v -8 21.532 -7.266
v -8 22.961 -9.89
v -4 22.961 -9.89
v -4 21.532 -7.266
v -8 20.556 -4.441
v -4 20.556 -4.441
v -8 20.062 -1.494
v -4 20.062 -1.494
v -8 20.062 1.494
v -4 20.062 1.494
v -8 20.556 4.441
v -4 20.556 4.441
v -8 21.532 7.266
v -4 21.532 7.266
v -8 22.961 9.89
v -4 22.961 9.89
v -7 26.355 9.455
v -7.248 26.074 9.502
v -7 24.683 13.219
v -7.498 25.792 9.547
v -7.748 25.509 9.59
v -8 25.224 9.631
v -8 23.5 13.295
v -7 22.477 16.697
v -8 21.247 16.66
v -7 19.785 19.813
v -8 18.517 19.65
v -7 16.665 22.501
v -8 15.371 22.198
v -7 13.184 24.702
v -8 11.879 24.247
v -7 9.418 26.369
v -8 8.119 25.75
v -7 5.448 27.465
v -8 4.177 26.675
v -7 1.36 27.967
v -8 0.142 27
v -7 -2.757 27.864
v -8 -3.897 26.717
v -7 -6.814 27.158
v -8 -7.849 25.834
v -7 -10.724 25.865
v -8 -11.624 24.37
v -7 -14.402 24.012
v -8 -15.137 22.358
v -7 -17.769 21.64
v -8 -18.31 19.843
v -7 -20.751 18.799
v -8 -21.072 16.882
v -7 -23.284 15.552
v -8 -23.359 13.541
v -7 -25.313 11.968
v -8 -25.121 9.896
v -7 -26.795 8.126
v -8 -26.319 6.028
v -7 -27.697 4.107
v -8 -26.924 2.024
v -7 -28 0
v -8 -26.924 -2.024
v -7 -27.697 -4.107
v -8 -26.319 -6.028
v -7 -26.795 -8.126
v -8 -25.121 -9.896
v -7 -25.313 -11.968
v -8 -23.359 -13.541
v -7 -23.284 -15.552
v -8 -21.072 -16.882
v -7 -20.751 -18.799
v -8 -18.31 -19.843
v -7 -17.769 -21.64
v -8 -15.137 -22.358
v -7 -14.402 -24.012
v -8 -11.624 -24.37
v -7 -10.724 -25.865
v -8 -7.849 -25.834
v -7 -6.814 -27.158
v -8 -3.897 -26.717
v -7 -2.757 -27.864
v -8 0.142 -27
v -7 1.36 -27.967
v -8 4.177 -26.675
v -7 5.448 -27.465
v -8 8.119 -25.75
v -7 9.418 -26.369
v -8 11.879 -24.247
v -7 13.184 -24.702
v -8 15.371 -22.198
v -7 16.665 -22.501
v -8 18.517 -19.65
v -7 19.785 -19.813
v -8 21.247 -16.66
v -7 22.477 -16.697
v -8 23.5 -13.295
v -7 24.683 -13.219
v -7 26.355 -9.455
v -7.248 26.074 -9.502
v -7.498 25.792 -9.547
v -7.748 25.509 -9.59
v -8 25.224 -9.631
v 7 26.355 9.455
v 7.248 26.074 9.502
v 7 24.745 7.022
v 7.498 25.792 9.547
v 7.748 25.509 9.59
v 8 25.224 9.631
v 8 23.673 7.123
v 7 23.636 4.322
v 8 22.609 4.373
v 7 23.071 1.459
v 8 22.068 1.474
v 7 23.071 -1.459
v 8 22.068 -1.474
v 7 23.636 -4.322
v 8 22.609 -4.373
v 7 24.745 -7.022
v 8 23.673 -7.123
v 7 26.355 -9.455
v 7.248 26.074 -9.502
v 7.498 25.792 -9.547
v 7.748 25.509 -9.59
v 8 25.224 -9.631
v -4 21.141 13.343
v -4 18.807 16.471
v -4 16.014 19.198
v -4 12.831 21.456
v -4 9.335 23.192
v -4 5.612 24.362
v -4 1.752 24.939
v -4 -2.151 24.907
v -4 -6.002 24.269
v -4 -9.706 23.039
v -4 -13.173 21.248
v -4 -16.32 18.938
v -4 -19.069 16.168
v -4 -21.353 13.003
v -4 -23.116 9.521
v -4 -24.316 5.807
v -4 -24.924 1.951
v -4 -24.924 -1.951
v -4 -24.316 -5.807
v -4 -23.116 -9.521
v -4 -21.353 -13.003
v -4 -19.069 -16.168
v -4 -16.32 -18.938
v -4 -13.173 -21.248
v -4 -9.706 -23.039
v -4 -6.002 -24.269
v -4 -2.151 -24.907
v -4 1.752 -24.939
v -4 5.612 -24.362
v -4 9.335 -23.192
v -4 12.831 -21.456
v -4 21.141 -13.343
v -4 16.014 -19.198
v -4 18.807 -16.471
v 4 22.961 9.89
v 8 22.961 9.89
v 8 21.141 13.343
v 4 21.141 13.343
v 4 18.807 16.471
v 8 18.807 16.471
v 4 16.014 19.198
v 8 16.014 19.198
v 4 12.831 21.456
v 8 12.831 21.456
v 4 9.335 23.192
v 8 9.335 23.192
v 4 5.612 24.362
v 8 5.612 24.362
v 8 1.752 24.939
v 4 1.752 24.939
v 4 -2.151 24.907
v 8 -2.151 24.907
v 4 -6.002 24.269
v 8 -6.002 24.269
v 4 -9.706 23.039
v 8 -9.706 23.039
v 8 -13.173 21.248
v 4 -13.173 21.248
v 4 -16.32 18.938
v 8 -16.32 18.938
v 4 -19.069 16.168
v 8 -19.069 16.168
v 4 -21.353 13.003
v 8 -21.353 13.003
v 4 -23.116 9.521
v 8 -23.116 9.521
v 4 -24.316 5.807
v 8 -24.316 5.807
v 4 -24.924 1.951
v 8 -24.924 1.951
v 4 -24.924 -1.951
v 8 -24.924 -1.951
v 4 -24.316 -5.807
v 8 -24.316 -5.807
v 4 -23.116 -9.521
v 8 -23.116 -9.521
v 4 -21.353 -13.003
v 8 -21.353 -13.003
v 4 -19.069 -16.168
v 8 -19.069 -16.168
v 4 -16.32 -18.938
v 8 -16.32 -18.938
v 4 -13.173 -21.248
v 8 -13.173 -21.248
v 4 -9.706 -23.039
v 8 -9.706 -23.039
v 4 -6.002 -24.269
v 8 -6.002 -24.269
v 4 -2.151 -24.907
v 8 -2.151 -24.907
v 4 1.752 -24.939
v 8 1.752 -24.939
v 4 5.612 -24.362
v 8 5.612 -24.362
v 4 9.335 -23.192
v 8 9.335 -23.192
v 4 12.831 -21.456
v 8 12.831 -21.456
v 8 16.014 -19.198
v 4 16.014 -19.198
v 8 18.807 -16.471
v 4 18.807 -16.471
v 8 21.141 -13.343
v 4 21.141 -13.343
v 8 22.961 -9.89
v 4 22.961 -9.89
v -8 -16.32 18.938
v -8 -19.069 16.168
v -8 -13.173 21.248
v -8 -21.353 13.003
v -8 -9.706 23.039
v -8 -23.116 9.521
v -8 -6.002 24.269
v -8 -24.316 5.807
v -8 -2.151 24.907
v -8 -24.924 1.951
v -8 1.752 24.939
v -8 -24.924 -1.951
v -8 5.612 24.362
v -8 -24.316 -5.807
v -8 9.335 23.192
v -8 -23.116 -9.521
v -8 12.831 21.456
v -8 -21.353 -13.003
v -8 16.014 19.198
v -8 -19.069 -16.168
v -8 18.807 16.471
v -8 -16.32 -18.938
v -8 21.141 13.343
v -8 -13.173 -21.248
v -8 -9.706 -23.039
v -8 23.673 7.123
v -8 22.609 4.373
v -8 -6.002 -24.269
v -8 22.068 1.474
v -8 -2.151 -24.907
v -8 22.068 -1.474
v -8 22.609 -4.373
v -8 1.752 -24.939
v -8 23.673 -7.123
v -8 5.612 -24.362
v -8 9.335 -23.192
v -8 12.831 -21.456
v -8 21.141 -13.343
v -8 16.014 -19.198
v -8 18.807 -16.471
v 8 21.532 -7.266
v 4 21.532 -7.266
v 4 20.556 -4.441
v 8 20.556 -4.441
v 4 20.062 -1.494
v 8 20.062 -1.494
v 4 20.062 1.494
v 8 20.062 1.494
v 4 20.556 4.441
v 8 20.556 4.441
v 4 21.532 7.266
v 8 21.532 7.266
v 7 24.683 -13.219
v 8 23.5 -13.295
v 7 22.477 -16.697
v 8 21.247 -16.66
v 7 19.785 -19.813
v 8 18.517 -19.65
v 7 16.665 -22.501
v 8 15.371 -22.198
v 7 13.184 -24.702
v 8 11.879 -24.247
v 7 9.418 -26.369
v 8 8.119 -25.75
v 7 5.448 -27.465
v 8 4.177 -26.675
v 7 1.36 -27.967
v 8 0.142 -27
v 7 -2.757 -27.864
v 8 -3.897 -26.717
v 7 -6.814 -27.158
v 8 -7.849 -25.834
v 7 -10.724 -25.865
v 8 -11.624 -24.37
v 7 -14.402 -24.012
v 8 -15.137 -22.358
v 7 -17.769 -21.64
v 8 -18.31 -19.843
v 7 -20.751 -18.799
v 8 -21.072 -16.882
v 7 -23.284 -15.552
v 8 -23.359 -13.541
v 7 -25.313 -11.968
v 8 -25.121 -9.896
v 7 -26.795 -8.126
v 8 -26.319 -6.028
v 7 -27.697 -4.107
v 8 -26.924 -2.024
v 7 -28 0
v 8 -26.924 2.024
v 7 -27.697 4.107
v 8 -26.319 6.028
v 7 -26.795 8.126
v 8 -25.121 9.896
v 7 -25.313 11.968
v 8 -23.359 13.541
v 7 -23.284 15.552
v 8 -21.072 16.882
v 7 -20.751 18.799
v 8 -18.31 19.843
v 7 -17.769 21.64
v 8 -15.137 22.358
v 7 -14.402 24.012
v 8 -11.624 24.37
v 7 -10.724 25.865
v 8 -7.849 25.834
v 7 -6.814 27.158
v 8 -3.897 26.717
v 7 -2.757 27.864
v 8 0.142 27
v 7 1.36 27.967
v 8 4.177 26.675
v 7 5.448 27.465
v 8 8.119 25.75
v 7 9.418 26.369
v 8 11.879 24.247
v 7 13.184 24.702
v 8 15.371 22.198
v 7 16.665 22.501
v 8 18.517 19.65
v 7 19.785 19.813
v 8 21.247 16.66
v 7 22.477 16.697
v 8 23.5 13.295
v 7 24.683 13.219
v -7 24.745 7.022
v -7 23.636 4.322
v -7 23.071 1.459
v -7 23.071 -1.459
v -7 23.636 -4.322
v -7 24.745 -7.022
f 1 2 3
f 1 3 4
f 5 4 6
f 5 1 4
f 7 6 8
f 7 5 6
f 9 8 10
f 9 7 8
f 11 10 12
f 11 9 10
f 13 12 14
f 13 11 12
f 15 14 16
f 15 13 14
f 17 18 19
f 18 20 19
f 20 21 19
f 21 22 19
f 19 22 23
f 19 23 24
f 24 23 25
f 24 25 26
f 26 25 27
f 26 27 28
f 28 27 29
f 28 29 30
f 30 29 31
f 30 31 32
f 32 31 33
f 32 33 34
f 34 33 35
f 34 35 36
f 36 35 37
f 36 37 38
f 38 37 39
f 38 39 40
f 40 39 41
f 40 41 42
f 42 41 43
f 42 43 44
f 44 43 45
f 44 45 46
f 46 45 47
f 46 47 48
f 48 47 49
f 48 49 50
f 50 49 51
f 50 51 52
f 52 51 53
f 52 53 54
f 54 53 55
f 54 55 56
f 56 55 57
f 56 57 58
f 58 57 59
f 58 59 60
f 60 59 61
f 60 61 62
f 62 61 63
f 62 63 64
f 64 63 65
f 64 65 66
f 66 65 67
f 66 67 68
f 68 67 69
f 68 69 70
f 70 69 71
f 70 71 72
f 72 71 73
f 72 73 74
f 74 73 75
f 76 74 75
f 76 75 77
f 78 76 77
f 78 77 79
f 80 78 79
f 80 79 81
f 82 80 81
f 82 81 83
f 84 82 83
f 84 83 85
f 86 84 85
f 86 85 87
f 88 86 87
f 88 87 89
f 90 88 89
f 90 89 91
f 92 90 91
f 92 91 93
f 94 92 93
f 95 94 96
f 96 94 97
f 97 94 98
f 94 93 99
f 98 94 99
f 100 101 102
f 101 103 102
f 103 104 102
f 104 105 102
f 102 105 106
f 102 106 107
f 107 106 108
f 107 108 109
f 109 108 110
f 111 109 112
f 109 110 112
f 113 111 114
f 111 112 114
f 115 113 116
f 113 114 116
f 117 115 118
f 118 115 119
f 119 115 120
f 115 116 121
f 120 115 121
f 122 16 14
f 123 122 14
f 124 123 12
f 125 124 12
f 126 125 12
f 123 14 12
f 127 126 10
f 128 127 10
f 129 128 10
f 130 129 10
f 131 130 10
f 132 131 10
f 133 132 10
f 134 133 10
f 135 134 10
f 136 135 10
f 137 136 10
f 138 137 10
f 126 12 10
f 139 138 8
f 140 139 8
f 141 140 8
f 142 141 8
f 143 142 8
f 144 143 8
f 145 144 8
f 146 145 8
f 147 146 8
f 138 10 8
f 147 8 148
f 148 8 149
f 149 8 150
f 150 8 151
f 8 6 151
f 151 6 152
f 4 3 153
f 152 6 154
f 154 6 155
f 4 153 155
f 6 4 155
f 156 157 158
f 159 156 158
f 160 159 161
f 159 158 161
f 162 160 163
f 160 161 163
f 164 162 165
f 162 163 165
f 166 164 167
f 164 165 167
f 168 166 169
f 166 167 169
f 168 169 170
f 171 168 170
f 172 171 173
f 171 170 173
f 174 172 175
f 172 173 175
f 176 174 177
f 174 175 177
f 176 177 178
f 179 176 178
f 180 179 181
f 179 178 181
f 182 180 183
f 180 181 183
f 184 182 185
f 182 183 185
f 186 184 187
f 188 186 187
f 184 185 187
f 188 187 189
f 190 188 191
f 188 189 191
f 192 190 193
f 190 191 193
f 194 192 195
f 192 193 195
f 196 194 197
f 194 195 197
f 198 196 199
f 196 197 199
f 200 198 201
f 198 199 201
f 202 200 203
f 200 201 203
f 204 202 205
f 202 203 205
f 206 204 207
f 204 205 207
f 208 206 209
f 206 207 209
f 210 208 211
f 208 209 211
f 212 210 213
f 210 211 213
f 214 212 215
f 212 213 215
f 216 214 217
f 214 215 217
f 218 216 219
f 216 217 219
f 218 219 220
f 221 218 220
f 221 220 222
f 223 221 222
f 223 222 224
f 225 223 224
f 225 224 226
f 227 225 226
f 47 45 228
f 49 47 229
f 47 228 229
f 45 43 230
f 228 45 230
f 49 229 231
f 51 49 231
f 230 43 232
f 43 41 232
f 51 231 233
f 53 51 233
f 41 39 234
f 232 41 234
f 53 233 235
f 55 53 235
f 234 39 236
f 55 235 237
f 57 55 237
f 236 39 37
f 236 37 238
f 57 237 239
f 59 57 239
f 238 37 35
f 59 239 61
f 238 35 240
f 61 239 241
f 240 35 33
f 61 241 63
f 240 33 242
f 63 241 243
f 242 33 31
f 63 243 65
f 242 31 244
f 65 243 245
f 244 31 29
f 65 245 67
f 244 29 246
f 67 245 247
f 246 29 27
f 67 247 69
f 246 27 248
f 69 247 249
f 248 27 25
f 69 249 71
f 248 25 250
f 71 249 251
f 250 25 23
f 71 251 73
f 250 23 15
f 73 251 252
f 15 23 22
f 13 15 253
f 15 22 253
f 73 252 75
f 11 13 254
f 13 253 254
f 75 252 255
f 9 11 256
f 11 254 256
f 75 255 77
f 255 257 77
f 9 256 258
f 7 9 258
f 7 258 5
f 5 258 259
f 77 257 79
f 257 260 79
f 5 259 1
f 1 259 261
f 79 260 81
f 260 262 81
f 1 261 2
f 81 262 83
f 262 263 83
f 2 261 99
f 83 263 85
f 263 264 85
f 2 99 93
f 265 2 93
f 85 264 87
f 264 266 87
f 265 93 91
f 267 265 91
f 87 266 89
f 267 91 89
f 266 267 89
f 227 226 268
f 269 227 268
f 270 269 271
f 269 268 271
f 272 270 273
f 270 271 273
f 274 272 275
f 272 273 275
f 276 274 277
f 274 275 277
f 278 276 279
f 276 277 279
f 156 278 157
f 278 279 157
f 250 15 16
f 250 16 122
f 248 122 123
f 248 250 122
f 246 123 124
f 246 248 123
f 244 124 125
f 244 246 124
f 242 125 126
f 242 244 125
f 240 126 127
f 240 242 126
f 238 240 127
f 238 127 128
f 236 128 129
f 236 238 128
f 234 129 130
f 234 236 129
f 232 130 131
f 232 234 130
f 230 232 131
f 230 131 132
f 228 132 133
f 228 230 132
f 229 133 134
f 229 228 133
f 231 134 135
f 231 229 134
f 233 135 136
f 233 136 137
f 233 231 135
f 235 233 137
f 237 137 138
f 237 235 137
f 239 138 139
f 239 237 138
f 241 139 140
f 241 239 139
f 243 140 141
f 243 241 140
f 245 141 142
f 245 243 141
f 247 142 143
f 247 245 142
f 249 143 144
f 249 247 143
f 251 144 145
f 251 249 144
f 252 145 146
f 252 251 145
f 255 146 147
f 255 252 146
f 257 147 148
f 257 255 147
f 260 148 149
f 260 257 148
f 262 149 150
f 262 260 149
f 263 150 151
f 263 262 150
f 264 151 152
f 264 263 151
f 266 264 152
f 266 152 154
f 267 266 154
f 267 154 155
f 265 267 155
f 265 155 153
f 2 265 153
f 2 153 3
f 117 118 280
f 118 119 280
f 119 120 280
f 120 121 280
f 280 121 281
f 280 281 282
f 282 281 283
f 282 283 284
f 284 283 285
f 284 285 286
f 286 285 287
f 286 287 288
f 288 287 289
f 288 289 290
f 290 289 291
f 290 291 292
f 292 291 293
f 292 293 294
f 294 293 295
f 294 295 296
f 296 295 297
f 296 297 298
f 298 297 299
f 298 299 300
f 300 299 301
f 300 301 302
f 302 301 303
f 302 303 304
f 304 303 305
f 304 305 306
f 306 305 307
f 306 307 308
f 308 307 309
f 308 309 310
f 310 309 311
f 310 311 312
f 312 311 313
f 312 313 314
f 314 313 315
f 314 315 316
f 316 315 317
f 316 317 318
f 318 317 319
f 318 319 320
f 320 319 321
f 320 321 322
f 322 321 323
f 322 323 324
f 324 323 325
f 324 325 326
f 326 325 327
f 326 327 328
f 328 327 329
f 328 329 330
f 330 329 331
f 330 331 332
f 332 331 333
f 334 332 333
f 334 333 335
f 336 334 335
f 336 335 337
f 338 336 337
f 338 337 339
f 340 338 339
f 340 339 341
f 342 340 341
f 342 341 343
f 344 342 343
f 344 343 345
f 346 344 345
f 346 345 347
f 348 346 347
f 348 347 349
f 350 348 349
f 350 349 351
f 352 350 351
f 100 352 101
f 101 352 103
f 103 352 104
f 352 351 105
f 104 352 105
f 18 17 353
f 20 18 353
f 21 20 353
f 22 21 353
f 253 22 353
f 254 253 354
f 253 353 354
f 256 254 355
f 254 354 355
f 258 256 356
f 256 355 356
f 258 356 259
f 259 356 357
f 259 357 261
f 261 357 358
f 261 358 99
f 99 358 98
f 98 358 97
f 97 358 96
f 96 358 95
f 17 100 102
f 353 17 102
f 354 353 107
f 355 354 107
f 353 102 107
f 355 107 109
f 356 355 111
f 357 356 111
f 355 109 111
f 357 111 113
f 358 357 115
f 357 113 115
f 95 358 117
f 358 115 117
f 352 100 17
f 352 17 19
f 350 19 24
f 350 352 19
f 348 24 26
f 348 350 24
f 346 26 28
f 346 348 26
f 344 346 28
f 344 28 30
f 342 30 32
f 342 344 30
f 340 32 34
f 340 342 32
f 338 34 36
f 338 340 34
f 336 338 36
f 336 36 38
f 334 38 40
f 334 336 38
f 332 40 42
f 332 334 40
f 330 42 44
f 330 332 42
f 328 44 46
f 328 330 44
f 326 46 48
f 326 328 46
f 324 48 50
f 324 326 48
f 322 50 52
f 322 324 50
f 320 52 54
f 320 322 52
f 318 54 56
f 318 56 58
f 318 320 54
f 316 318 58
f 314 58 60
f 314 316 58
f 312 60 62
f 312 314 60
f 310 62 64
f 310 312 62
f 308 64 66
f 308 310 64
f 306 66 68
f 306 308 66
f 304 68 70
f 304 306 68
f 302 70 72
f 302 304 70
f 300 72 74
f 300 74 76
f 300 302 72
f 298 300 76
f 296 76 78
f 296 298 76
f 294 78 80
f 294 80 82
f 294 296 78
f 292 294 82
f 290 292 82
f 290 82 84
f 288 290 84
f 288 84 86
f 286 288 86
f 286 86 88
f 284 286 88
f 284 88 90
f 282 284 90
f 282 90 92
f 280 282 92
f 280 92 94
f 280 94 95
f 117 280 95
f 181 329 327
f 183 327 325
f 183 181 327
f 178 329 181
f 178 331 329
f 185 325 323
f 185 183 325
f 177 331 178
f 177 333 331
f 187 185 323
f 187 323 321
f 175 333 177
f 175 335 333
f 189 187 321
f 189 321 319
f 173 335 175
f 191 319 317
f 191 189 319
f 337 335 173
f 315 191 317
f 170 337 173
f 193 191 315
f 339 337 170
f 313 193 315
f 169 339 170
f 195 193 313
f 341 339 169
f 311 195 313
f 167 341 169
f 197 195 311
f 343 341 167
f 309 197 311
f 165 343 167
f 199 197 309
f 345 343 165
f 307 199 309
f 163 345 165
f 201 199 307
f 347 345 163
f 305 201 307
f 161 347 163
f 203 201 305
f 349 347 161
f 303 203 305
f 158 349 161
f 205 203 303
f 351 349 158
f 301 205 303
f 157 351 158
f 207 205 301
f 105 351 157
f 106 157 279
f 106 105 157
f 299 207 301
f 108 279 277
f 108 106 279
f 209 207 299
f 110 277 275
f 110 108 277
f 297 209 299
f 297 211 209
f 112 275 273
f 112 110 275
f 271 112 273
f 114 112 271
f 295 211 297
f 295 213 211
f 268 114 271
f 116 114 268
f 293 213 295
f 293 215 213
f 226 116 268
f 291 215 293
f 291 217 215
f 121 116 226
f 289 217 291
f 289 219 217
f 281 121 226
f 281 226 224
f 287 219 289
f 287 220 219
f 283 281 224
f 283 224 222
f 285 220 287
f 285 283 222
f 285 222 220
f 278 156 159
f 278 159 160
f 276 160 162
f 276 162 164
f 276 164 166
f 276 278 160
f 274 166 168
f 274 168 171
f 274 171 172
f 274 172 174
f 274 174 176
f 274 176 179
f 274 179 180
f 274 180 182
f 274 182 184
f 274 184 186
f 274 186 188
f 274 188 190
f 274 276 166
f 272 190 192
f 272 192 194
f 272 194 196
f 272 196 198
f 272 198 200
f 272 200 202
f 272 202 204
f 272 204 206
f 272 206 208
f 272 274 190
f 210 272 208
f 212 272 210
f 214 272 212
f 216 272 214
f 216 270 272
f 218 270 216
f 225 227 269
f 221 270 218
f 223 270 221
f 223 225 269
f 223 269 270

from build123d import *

# Parameters (mm, degrees)
SKETCH1_R           = 28
BOSS_EXTRUDE1_DEPTH = 8
SKETCH2_R           = 15
CUT_EXTRUDE1_DEPTH  = 43.708313008
CHAMFER1_SIZE       = 1
CUT_EXTRUDE2_DEPTH  = 4


with BuildPart() as part:
    # Sketch1 → Boss-Extrude1 (new, symmetric)
    with BuildSketch(Plane(origin=(0, 0, 0), x_dir=(0, 0, -1), z_dir=(1, 0, 0))):
        Circle(SKETCH1_R)
    extrude(amount=BOSS_EXTRUDE1_DEPTH, both=True)

    # Sketch2 → Cut-Extrude1 (cut, through all)
    with BuildSketch(Plane(origin=(8, 0, 0), x_dir=(0, 0, -1), z_dir=(1, 0, 0))):
        with Locations((0, 38)):
            Circle(SKETCH2_R)
    extrude(amount=-CUT_EXTRUDE1_DEPTH, mode=Mode.SUBTRACT)

    # Chamfer1
    chamfer1_edges = [part.edges().sort_by_distance(p)[0] for p in [
        (-8, -28, 0),
        (8, -28, 0),
        (8, 23, 0),
        (-8, 23, 0),
    ]]
    chamfer(chamfer1_edges, length=CHAMFER1_SIZE)

    # Sketch3 → Cut-Extrude2 (cut)
    with BuildSketch(Plane(origin=(8, 0, 0), x_dir=(0, 0, -1), z_dir=(1, 0, 0))):
        with BuildLine():
            ThreePointArc((-9.89010775, 22.960526316), (0, -25), (9.89010775, 22.960526316))
            ThreePointArc((9.89010775, 22.960526316), (0, 20), (-9.89010775, 22.960526316))
        make_face()
    cut_extrude2 = extrude(amount=-CUT_EXTRUDE2_DEPTH, mode=Mode.SUBTRACT)

    # Mirror1: Cut-Extrude2 across plane
    add(cut_extrude2.mirror(Plane(origin=(0, 0, 0), x_dir=(0, 0, 1), z_dir=(1, 0, 0))), mode=Mode.SUBTRACT)


solid = part.part
